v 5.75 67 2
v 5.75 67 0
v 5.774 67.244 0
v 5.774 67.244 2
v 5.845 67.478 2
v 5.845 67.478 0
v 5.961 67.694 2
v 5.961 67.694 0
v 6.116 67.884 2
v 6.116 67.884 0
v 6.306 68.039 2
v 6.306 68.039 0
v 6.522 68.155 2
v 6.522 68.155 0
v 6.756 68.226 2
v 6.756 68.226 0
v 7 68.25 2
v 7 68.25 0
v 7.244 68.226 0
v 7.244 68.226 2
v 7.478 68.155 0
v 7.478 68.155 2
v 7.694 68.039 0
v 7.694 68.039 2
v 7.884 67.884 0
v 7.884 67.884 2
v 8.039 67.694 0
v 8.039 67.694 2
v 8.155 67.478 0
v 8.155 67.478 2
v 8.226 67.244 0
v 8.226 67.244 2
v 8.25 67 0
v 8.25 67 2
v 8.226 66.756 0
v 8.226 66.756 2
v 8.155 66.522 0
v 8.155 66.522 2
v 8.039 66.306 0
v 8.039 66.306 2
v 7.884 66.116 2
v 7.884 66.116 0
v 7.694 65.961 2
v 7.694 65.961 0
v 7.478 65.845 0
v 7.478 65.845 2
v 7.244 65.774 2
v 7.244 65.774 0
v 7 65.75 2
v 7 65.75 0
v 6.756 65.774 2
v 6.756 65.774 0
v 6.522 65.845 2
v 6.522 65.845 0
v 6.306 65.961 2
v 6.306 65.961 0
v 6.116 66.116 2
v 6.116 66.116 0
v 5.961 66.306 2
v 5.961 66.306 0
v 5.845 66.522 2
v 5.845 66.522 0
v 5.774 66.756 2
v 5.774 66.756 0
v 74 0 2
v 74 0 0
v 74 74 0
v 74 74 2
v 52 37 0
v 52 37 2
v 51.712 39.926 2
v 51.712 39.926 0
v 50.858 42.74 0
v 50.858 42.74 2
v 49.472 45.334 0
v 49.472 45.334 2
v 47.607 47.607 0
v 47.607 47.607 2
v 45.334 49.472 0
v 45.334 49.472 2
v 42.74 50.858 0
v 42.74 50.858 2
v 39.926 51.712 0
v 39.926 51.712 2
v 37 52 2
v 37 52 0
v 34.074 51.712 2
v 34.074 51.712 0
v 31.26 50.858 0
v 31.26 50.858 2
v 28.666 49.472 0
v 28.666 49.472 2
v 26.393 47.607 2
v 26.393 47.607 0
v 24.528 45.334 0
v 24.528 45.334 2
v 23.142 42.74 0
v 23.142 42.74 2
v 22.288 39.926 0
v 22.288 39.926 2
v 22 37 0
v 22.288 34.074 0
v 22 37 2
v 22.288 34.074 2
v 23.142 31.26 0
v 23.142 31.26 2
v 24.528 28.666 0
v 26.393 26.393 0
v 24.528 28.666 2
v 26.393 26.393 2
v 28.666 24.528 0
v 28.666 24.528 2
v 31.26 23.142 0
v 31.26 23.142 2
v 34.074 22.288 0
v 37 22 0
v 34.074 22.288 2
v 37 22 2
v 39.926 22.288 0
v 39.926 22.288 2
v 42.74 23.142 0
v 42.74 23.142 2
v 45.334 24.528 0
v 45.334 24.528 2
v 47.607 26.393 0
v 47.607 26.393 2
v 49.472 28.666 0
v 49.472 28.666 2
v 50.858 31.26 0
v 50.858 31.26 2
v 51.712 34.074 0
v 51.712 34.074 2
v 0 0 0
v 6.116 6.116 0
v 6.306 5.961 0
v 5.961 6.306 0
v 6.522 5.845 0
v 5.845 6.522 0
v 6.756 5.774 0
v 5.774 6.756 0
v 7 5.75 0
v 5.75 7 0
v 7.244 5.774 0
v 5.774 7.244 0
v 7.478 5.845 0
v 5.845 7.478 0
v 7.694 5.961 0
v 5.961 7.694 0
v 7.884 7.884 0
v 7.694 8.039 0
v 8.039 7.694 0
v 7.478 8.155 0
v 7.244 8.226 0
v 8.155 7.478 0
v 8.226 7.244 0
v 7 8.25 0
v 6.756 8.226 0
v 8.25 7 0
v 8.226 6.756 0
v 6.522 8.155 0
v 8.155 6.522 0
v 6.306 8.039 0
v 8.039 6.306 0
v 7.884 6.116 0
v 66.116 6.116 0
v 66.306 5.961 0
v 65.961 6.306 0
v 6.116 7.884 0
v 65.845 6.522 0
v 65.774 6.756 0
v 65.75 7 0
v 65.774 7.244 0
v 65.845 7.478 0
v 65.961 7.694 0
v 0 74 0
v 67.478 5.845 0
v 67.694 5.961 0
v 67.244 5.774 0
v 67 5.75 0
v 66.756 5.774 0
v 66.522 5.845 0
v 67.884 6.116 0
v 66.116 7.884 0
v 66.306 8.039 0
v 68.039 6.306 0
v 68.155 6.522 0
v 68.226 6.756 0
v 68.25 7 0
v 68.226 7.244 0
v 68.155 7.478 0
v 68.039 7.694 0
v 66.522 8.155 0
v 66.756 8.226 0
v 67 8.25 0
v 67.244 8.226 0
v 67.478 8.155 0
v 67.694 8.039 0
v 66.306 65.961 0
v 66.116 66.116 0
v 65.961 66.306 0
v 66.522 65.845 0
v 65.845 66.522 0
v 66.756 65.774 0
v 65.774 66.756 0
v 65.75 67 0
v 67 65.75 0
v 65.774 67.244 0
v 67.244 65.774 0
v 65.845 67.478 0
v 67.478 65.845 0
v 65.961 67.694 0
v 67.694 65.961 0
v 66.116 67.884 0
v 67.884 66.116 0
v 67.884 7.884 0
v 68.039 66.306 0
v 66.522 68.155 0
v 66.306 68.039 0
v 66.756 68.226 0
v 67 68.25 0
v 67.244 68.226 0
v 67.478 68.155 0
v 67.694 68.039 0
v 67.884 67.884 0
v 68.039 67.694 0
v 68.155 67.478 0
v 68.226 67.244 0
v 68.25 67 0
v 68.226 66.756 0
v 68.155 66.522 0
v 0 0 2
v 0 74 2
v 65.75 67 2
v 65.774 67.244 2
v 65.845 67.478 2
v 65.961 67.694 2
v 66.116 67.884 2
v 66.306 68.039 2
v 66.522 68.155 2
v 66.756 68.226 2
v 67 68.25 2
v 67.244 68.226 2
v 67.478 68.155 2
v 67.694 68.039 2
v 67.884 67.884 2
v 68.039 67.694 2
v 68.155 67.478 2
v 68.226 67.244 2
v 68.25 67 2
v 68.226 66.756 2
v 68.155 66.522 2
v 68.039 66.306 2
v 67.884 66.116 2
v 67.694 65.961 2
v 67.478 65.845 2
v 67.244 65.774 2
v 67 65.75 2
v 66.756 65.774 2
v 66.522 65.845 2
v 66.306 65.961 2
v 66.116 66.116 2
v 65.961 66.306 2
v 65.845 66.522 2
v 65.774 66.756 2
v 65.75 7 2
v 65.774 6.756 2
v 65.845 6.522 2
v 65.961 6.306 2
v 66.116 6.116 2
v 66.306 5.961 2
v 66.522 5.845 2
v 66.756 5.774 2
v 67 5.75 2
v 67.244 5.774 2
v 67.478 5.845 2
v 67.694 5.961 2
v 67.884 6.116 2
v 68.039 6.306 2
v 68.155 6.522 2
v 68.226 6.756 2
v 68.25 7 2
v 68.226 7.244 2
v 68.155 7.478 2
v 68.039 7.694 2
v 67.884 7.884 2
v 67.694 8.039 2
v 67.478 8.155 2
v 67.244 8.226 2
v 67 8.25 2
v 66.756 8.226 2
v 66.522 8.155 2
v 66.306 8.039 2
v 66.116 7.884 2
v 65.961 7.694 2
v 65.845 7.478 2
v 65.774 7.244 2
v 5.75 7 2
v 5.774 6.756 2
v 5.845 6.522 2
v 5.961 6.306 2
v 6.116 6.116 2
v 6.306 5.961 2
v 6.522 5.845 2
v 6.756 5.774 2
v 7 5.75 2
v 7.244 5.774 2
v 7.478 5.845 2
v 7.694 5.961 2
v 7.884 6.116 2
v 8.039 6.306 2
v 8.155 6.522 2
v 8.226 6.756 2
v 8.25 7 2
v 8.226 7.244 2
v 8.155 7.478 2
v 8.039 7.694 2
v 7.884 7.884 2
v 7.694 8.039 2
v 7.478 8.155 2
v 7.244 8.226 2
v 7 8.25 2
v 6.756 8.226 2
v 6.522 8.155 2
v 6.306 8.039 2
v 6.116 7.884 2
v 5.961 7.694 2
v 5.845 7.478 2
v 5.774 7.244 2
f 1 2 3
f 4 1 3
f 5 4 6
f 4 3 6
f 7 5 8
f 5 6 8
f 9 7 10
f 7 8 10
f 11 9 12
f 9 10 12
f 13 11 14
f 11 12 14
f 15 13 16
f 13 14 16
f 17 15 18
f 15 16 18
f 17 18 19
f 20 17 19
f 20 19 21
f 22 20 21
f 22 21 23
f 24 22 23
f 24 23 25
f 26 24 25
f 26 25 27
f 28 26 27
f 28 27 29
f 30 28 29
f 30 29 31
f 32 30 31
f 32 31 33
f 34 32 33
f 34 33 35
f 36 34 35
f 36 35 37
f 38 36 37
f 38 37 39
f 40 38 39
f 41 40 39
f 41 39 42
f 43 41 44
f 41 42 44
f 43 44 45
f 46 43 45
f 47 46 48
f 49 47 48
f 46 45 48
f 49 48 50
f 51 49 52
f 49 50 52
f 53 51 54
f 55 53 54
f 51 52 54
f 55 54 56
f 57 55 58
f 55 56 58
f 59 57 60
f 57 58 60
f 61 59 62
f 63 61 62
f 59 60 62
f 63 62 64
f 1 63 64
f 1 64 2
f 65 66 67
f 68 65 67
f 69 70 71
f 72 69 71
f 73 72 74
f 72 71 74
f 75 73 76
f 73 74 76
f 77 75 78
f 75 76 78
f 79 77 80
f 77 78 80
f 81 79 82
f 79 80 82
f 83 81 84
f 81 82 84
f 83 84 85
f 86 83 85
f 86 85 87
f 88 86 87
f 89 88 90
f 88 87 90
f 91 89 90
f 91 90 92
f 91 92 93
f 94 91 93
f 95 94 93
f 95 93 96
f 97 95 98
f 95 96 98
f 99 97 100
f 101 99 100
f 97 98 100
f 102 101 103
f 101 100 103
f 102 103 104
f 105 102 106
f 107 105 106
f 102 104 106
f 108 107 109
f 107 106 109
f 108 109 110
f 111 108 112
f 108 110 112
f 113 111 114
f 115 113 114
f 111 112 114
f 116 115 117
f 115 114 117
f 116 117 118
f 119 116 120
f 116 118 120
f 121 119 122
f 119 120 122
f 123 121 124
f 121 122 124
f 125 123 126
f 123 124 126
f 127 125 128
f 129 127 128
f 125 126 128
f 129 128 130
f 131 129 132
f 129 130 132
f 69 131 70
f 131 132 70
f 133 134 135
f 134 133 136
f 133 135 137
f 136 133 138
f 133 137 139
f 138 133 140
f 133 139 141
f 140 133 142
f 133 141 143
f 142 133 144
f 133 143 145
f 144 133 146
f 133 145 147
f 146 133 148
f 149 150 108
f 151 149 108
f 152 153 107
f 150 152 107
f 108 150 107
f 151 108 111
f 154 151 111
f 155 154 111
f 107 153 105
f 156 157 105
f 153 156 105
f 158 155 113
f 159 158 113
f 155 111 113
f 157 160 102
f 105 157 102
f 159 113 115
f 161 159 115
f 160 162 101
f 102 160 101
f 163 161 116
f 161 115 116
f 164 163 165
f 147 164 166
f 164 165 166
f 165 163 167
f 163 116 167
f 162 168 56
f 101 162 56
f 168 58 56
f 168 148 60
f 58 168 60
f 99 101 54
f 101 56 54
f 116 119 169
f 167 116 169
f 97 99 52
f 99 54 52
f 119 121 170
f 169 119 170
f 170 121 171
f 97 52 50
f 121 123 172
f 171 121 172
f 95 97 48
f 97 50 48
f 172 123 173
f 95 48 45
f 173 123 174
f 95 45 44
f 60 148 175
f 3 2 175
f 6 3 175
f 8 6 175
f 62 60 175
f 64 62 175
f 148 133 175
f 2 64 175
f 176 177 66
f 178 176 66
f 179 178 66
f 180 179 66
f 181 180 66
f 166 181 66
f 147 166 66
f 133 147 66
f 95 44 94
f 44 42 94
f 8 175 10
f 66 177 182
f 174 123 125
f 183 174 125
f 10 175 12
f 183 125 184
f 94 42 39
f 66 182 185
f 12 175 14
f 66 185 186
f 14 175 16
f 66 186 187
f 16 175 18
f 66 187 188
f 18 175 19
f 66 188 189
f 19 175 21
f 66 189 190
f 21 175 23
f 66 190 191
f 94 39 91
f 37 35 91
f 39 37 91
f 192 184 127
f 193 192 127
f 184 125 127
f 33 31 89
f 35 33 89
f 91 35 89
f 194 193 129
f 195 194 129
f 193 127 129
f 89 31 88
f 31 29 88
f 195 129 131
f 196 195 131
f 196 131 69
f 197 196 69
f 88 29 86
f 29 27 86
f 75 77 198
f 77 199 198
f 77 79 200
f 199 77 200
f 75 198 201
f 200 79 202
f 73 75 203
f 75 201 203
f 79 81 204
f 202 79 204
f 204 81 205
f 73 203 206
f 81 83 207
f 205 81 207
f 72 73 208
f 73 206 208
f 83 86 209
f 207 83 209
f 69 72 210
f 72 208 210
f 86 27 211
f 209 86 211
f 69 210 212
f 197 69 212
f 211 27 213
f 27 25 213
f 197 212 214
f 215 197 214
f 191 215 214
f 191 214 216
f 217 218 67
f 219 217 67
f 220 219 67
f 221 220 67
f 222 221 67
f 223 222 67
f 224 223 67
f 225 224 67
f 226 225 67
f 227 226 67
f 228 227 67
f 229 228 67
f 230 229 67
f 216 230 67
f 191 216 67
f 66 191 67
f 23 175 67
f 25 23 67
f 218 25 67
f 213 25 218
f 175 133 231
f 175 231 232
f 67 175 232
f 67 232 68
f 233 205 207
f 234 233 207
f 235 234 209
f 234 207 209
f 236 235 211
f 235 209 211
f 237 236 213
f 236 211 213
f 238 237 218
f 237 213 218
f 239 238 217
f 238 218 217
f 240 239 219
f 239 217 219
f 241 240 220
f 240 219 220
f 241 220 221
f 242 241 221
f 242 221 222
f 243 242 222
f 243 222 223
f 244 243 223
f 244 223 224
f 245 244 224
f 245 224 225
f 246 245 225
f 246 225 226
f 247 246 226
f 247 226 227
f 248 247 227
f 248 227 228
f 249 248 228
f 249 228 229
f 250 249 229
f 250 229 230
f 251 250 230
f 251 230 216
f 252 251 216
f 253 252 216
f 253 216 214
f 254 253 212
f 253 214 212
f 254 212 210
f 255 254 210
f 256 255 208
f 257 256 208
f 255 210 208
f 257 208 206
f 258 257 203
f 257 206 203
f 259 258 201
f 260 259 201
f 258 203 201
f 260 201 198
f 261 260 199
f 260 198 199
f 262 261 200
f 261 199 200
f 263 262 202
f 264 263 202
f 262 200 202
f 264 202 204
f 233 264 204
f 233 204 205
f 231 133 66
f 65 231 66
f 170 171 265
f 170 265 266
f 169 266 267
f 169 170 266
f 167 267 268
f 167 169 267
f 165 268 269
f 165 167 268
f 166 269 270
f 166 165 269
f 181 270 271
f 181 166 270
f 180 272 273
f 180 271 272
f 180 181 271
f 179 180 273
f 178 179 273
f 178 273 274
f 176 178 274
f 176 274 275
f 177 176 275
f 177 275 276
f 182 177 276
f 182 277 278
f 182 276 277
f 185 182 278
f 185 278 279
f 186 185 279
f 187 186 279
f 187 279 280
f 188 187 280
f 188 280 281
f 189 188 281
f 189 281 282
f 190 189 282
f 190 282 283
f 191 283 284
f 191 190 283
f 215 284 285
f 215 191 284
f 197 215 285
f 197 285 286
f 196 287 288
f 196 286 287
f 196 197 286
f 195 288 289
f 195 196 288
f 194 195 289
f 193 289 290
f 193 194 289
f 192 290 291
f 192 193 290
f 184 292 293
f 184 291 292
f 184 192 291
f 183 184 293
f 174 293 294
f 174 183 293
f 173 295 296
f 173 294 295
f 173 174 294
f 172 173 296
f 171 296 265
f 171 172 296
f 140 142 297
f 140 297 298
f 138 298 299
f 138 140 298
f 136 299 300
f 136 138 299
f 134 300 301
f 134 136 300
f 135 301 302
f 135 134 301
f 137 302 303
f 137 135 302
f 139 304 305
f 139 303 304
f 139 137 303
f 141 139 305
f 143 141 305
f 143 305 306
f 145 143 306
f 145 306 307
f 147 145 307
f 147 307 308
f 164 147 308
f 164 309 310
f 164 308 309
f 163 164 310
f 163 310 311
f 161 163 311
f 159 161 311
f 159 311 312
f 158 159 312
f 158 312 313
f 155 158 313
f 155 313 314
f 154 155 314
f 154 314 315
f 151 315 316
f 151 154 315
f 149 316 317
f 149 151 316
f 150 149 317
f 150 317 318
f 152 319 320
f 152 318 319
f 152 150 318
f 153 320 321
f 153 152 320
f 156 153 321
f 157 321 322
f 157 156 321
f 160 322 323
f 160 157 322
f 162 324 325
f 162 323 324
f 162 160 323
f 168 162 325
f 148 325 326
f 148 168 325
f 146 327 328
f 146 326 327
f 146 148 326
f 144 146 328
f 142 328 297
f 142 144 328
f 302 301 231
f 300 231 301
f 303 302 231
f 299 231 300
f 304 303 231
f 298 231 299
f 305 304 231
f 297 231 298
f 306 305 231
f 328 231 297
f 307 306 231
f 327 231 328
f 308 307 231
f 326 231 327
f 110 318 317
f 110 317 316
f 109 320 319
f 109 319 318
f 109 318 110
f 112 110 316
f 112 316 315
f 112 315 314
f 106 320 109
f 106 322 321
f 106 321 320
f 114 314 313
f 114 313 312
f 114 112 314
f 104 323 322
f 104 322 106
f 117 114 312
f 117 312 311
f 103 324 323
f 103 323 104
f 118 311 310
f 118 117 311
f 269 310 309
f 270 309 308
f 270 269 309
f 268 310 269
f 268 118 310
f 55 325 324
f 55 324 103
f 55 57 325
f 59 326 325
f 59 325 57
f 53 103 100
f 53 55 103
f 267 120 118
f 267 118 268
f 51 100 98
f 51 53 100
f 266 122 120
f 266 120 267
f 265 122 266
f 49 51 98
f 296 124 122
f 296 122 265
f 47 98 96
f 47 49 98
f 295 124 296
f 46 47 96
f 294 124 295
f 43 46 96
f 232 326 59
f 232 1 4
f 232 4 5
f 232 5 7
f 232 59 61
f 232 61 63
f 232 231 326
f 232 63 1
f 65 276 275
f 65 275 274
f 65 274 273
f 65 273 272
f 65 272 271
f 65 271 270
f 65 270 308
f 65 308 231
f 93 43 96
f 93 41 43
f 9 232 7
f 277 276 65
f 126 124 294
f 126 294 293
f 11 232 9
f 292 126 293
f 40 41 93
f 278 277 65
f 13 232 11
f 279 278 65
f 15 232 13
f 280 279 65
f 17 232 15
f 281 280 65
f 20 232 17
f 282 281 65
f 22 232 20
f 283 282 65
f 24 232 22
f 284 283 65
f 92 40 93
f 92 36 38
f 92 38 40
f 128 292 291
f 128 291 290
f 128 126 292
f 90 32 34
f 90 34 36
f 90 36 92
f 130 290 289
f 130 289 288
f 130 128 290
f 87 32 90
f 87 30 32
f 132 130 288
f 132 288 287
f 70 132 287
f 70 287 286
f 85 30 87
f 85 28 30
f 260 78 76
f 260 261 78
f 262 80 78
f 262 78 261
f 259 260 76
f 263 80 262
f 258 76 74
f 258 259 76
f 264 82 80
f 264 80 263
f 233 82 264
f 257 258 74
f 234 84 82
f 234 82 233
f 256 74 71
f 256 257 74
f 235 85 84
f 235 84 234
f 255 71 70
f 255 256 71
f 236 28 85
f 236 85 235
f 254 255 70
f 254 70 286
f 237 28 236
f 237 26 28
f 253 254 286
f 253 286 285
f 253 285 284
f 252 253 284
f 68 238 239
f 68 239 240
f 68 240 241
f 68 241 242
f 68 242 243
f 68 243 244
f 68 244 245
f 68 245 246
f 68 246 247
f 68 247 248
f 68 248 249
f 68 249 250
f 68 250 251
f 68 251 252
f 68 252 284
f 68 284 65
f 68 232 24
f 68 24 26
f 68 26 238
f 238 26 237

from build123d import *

# Parameters (mm, degrees)
SKETCH_1_W          = 74
SKETCH_1_H          = 74
EXTRUDE_1_DEPTH     = 2
SKETCH_2_R          = 15
CUT_EXTRUDE_1_DEPTH = 2
M3X0_5_1_D          = 2.5


with BuildPart() as part:
    # ｽｹｯﾁ1 → ﾎﾞｽ - 押し出し1 (new body)
    with BuildSketch(Plane.XY):
        with Locations((37, 37)):
            Rectangle(SKETCH_1_W, SKETCH_1_H)
    extrude(amount=EXTRUDE_1_DEPTH)

    # ｽｹｯﾁ2 → ｶｯﾄ - 押し出し1 (cut)
    with BuildSketch(Plane.XY.offset(2)):
        with Locations((37, 37)):
            Circle(SKETCH_2_R)
    extrude(amount=-CUT_EXTRUDE_1_DEPTH, mode=Mode.SUBTRACT)

    # M3x0.5 ねじ穴1 (through all)
    with Locations(Plane.XY.offset(2)):
        with Locations((7, 67), (67, 67)):
            m3x0_5_1 = Hole(M3X0_5_1_D / 2)

    # ﾐﾗｰ1: M3x0.5 ねじ穴1 across plane
    add(m3x0_5_1.mirror(Plane.ZX.offset(37)), mode=Mode.SUBTRACT)


solid = part.part
